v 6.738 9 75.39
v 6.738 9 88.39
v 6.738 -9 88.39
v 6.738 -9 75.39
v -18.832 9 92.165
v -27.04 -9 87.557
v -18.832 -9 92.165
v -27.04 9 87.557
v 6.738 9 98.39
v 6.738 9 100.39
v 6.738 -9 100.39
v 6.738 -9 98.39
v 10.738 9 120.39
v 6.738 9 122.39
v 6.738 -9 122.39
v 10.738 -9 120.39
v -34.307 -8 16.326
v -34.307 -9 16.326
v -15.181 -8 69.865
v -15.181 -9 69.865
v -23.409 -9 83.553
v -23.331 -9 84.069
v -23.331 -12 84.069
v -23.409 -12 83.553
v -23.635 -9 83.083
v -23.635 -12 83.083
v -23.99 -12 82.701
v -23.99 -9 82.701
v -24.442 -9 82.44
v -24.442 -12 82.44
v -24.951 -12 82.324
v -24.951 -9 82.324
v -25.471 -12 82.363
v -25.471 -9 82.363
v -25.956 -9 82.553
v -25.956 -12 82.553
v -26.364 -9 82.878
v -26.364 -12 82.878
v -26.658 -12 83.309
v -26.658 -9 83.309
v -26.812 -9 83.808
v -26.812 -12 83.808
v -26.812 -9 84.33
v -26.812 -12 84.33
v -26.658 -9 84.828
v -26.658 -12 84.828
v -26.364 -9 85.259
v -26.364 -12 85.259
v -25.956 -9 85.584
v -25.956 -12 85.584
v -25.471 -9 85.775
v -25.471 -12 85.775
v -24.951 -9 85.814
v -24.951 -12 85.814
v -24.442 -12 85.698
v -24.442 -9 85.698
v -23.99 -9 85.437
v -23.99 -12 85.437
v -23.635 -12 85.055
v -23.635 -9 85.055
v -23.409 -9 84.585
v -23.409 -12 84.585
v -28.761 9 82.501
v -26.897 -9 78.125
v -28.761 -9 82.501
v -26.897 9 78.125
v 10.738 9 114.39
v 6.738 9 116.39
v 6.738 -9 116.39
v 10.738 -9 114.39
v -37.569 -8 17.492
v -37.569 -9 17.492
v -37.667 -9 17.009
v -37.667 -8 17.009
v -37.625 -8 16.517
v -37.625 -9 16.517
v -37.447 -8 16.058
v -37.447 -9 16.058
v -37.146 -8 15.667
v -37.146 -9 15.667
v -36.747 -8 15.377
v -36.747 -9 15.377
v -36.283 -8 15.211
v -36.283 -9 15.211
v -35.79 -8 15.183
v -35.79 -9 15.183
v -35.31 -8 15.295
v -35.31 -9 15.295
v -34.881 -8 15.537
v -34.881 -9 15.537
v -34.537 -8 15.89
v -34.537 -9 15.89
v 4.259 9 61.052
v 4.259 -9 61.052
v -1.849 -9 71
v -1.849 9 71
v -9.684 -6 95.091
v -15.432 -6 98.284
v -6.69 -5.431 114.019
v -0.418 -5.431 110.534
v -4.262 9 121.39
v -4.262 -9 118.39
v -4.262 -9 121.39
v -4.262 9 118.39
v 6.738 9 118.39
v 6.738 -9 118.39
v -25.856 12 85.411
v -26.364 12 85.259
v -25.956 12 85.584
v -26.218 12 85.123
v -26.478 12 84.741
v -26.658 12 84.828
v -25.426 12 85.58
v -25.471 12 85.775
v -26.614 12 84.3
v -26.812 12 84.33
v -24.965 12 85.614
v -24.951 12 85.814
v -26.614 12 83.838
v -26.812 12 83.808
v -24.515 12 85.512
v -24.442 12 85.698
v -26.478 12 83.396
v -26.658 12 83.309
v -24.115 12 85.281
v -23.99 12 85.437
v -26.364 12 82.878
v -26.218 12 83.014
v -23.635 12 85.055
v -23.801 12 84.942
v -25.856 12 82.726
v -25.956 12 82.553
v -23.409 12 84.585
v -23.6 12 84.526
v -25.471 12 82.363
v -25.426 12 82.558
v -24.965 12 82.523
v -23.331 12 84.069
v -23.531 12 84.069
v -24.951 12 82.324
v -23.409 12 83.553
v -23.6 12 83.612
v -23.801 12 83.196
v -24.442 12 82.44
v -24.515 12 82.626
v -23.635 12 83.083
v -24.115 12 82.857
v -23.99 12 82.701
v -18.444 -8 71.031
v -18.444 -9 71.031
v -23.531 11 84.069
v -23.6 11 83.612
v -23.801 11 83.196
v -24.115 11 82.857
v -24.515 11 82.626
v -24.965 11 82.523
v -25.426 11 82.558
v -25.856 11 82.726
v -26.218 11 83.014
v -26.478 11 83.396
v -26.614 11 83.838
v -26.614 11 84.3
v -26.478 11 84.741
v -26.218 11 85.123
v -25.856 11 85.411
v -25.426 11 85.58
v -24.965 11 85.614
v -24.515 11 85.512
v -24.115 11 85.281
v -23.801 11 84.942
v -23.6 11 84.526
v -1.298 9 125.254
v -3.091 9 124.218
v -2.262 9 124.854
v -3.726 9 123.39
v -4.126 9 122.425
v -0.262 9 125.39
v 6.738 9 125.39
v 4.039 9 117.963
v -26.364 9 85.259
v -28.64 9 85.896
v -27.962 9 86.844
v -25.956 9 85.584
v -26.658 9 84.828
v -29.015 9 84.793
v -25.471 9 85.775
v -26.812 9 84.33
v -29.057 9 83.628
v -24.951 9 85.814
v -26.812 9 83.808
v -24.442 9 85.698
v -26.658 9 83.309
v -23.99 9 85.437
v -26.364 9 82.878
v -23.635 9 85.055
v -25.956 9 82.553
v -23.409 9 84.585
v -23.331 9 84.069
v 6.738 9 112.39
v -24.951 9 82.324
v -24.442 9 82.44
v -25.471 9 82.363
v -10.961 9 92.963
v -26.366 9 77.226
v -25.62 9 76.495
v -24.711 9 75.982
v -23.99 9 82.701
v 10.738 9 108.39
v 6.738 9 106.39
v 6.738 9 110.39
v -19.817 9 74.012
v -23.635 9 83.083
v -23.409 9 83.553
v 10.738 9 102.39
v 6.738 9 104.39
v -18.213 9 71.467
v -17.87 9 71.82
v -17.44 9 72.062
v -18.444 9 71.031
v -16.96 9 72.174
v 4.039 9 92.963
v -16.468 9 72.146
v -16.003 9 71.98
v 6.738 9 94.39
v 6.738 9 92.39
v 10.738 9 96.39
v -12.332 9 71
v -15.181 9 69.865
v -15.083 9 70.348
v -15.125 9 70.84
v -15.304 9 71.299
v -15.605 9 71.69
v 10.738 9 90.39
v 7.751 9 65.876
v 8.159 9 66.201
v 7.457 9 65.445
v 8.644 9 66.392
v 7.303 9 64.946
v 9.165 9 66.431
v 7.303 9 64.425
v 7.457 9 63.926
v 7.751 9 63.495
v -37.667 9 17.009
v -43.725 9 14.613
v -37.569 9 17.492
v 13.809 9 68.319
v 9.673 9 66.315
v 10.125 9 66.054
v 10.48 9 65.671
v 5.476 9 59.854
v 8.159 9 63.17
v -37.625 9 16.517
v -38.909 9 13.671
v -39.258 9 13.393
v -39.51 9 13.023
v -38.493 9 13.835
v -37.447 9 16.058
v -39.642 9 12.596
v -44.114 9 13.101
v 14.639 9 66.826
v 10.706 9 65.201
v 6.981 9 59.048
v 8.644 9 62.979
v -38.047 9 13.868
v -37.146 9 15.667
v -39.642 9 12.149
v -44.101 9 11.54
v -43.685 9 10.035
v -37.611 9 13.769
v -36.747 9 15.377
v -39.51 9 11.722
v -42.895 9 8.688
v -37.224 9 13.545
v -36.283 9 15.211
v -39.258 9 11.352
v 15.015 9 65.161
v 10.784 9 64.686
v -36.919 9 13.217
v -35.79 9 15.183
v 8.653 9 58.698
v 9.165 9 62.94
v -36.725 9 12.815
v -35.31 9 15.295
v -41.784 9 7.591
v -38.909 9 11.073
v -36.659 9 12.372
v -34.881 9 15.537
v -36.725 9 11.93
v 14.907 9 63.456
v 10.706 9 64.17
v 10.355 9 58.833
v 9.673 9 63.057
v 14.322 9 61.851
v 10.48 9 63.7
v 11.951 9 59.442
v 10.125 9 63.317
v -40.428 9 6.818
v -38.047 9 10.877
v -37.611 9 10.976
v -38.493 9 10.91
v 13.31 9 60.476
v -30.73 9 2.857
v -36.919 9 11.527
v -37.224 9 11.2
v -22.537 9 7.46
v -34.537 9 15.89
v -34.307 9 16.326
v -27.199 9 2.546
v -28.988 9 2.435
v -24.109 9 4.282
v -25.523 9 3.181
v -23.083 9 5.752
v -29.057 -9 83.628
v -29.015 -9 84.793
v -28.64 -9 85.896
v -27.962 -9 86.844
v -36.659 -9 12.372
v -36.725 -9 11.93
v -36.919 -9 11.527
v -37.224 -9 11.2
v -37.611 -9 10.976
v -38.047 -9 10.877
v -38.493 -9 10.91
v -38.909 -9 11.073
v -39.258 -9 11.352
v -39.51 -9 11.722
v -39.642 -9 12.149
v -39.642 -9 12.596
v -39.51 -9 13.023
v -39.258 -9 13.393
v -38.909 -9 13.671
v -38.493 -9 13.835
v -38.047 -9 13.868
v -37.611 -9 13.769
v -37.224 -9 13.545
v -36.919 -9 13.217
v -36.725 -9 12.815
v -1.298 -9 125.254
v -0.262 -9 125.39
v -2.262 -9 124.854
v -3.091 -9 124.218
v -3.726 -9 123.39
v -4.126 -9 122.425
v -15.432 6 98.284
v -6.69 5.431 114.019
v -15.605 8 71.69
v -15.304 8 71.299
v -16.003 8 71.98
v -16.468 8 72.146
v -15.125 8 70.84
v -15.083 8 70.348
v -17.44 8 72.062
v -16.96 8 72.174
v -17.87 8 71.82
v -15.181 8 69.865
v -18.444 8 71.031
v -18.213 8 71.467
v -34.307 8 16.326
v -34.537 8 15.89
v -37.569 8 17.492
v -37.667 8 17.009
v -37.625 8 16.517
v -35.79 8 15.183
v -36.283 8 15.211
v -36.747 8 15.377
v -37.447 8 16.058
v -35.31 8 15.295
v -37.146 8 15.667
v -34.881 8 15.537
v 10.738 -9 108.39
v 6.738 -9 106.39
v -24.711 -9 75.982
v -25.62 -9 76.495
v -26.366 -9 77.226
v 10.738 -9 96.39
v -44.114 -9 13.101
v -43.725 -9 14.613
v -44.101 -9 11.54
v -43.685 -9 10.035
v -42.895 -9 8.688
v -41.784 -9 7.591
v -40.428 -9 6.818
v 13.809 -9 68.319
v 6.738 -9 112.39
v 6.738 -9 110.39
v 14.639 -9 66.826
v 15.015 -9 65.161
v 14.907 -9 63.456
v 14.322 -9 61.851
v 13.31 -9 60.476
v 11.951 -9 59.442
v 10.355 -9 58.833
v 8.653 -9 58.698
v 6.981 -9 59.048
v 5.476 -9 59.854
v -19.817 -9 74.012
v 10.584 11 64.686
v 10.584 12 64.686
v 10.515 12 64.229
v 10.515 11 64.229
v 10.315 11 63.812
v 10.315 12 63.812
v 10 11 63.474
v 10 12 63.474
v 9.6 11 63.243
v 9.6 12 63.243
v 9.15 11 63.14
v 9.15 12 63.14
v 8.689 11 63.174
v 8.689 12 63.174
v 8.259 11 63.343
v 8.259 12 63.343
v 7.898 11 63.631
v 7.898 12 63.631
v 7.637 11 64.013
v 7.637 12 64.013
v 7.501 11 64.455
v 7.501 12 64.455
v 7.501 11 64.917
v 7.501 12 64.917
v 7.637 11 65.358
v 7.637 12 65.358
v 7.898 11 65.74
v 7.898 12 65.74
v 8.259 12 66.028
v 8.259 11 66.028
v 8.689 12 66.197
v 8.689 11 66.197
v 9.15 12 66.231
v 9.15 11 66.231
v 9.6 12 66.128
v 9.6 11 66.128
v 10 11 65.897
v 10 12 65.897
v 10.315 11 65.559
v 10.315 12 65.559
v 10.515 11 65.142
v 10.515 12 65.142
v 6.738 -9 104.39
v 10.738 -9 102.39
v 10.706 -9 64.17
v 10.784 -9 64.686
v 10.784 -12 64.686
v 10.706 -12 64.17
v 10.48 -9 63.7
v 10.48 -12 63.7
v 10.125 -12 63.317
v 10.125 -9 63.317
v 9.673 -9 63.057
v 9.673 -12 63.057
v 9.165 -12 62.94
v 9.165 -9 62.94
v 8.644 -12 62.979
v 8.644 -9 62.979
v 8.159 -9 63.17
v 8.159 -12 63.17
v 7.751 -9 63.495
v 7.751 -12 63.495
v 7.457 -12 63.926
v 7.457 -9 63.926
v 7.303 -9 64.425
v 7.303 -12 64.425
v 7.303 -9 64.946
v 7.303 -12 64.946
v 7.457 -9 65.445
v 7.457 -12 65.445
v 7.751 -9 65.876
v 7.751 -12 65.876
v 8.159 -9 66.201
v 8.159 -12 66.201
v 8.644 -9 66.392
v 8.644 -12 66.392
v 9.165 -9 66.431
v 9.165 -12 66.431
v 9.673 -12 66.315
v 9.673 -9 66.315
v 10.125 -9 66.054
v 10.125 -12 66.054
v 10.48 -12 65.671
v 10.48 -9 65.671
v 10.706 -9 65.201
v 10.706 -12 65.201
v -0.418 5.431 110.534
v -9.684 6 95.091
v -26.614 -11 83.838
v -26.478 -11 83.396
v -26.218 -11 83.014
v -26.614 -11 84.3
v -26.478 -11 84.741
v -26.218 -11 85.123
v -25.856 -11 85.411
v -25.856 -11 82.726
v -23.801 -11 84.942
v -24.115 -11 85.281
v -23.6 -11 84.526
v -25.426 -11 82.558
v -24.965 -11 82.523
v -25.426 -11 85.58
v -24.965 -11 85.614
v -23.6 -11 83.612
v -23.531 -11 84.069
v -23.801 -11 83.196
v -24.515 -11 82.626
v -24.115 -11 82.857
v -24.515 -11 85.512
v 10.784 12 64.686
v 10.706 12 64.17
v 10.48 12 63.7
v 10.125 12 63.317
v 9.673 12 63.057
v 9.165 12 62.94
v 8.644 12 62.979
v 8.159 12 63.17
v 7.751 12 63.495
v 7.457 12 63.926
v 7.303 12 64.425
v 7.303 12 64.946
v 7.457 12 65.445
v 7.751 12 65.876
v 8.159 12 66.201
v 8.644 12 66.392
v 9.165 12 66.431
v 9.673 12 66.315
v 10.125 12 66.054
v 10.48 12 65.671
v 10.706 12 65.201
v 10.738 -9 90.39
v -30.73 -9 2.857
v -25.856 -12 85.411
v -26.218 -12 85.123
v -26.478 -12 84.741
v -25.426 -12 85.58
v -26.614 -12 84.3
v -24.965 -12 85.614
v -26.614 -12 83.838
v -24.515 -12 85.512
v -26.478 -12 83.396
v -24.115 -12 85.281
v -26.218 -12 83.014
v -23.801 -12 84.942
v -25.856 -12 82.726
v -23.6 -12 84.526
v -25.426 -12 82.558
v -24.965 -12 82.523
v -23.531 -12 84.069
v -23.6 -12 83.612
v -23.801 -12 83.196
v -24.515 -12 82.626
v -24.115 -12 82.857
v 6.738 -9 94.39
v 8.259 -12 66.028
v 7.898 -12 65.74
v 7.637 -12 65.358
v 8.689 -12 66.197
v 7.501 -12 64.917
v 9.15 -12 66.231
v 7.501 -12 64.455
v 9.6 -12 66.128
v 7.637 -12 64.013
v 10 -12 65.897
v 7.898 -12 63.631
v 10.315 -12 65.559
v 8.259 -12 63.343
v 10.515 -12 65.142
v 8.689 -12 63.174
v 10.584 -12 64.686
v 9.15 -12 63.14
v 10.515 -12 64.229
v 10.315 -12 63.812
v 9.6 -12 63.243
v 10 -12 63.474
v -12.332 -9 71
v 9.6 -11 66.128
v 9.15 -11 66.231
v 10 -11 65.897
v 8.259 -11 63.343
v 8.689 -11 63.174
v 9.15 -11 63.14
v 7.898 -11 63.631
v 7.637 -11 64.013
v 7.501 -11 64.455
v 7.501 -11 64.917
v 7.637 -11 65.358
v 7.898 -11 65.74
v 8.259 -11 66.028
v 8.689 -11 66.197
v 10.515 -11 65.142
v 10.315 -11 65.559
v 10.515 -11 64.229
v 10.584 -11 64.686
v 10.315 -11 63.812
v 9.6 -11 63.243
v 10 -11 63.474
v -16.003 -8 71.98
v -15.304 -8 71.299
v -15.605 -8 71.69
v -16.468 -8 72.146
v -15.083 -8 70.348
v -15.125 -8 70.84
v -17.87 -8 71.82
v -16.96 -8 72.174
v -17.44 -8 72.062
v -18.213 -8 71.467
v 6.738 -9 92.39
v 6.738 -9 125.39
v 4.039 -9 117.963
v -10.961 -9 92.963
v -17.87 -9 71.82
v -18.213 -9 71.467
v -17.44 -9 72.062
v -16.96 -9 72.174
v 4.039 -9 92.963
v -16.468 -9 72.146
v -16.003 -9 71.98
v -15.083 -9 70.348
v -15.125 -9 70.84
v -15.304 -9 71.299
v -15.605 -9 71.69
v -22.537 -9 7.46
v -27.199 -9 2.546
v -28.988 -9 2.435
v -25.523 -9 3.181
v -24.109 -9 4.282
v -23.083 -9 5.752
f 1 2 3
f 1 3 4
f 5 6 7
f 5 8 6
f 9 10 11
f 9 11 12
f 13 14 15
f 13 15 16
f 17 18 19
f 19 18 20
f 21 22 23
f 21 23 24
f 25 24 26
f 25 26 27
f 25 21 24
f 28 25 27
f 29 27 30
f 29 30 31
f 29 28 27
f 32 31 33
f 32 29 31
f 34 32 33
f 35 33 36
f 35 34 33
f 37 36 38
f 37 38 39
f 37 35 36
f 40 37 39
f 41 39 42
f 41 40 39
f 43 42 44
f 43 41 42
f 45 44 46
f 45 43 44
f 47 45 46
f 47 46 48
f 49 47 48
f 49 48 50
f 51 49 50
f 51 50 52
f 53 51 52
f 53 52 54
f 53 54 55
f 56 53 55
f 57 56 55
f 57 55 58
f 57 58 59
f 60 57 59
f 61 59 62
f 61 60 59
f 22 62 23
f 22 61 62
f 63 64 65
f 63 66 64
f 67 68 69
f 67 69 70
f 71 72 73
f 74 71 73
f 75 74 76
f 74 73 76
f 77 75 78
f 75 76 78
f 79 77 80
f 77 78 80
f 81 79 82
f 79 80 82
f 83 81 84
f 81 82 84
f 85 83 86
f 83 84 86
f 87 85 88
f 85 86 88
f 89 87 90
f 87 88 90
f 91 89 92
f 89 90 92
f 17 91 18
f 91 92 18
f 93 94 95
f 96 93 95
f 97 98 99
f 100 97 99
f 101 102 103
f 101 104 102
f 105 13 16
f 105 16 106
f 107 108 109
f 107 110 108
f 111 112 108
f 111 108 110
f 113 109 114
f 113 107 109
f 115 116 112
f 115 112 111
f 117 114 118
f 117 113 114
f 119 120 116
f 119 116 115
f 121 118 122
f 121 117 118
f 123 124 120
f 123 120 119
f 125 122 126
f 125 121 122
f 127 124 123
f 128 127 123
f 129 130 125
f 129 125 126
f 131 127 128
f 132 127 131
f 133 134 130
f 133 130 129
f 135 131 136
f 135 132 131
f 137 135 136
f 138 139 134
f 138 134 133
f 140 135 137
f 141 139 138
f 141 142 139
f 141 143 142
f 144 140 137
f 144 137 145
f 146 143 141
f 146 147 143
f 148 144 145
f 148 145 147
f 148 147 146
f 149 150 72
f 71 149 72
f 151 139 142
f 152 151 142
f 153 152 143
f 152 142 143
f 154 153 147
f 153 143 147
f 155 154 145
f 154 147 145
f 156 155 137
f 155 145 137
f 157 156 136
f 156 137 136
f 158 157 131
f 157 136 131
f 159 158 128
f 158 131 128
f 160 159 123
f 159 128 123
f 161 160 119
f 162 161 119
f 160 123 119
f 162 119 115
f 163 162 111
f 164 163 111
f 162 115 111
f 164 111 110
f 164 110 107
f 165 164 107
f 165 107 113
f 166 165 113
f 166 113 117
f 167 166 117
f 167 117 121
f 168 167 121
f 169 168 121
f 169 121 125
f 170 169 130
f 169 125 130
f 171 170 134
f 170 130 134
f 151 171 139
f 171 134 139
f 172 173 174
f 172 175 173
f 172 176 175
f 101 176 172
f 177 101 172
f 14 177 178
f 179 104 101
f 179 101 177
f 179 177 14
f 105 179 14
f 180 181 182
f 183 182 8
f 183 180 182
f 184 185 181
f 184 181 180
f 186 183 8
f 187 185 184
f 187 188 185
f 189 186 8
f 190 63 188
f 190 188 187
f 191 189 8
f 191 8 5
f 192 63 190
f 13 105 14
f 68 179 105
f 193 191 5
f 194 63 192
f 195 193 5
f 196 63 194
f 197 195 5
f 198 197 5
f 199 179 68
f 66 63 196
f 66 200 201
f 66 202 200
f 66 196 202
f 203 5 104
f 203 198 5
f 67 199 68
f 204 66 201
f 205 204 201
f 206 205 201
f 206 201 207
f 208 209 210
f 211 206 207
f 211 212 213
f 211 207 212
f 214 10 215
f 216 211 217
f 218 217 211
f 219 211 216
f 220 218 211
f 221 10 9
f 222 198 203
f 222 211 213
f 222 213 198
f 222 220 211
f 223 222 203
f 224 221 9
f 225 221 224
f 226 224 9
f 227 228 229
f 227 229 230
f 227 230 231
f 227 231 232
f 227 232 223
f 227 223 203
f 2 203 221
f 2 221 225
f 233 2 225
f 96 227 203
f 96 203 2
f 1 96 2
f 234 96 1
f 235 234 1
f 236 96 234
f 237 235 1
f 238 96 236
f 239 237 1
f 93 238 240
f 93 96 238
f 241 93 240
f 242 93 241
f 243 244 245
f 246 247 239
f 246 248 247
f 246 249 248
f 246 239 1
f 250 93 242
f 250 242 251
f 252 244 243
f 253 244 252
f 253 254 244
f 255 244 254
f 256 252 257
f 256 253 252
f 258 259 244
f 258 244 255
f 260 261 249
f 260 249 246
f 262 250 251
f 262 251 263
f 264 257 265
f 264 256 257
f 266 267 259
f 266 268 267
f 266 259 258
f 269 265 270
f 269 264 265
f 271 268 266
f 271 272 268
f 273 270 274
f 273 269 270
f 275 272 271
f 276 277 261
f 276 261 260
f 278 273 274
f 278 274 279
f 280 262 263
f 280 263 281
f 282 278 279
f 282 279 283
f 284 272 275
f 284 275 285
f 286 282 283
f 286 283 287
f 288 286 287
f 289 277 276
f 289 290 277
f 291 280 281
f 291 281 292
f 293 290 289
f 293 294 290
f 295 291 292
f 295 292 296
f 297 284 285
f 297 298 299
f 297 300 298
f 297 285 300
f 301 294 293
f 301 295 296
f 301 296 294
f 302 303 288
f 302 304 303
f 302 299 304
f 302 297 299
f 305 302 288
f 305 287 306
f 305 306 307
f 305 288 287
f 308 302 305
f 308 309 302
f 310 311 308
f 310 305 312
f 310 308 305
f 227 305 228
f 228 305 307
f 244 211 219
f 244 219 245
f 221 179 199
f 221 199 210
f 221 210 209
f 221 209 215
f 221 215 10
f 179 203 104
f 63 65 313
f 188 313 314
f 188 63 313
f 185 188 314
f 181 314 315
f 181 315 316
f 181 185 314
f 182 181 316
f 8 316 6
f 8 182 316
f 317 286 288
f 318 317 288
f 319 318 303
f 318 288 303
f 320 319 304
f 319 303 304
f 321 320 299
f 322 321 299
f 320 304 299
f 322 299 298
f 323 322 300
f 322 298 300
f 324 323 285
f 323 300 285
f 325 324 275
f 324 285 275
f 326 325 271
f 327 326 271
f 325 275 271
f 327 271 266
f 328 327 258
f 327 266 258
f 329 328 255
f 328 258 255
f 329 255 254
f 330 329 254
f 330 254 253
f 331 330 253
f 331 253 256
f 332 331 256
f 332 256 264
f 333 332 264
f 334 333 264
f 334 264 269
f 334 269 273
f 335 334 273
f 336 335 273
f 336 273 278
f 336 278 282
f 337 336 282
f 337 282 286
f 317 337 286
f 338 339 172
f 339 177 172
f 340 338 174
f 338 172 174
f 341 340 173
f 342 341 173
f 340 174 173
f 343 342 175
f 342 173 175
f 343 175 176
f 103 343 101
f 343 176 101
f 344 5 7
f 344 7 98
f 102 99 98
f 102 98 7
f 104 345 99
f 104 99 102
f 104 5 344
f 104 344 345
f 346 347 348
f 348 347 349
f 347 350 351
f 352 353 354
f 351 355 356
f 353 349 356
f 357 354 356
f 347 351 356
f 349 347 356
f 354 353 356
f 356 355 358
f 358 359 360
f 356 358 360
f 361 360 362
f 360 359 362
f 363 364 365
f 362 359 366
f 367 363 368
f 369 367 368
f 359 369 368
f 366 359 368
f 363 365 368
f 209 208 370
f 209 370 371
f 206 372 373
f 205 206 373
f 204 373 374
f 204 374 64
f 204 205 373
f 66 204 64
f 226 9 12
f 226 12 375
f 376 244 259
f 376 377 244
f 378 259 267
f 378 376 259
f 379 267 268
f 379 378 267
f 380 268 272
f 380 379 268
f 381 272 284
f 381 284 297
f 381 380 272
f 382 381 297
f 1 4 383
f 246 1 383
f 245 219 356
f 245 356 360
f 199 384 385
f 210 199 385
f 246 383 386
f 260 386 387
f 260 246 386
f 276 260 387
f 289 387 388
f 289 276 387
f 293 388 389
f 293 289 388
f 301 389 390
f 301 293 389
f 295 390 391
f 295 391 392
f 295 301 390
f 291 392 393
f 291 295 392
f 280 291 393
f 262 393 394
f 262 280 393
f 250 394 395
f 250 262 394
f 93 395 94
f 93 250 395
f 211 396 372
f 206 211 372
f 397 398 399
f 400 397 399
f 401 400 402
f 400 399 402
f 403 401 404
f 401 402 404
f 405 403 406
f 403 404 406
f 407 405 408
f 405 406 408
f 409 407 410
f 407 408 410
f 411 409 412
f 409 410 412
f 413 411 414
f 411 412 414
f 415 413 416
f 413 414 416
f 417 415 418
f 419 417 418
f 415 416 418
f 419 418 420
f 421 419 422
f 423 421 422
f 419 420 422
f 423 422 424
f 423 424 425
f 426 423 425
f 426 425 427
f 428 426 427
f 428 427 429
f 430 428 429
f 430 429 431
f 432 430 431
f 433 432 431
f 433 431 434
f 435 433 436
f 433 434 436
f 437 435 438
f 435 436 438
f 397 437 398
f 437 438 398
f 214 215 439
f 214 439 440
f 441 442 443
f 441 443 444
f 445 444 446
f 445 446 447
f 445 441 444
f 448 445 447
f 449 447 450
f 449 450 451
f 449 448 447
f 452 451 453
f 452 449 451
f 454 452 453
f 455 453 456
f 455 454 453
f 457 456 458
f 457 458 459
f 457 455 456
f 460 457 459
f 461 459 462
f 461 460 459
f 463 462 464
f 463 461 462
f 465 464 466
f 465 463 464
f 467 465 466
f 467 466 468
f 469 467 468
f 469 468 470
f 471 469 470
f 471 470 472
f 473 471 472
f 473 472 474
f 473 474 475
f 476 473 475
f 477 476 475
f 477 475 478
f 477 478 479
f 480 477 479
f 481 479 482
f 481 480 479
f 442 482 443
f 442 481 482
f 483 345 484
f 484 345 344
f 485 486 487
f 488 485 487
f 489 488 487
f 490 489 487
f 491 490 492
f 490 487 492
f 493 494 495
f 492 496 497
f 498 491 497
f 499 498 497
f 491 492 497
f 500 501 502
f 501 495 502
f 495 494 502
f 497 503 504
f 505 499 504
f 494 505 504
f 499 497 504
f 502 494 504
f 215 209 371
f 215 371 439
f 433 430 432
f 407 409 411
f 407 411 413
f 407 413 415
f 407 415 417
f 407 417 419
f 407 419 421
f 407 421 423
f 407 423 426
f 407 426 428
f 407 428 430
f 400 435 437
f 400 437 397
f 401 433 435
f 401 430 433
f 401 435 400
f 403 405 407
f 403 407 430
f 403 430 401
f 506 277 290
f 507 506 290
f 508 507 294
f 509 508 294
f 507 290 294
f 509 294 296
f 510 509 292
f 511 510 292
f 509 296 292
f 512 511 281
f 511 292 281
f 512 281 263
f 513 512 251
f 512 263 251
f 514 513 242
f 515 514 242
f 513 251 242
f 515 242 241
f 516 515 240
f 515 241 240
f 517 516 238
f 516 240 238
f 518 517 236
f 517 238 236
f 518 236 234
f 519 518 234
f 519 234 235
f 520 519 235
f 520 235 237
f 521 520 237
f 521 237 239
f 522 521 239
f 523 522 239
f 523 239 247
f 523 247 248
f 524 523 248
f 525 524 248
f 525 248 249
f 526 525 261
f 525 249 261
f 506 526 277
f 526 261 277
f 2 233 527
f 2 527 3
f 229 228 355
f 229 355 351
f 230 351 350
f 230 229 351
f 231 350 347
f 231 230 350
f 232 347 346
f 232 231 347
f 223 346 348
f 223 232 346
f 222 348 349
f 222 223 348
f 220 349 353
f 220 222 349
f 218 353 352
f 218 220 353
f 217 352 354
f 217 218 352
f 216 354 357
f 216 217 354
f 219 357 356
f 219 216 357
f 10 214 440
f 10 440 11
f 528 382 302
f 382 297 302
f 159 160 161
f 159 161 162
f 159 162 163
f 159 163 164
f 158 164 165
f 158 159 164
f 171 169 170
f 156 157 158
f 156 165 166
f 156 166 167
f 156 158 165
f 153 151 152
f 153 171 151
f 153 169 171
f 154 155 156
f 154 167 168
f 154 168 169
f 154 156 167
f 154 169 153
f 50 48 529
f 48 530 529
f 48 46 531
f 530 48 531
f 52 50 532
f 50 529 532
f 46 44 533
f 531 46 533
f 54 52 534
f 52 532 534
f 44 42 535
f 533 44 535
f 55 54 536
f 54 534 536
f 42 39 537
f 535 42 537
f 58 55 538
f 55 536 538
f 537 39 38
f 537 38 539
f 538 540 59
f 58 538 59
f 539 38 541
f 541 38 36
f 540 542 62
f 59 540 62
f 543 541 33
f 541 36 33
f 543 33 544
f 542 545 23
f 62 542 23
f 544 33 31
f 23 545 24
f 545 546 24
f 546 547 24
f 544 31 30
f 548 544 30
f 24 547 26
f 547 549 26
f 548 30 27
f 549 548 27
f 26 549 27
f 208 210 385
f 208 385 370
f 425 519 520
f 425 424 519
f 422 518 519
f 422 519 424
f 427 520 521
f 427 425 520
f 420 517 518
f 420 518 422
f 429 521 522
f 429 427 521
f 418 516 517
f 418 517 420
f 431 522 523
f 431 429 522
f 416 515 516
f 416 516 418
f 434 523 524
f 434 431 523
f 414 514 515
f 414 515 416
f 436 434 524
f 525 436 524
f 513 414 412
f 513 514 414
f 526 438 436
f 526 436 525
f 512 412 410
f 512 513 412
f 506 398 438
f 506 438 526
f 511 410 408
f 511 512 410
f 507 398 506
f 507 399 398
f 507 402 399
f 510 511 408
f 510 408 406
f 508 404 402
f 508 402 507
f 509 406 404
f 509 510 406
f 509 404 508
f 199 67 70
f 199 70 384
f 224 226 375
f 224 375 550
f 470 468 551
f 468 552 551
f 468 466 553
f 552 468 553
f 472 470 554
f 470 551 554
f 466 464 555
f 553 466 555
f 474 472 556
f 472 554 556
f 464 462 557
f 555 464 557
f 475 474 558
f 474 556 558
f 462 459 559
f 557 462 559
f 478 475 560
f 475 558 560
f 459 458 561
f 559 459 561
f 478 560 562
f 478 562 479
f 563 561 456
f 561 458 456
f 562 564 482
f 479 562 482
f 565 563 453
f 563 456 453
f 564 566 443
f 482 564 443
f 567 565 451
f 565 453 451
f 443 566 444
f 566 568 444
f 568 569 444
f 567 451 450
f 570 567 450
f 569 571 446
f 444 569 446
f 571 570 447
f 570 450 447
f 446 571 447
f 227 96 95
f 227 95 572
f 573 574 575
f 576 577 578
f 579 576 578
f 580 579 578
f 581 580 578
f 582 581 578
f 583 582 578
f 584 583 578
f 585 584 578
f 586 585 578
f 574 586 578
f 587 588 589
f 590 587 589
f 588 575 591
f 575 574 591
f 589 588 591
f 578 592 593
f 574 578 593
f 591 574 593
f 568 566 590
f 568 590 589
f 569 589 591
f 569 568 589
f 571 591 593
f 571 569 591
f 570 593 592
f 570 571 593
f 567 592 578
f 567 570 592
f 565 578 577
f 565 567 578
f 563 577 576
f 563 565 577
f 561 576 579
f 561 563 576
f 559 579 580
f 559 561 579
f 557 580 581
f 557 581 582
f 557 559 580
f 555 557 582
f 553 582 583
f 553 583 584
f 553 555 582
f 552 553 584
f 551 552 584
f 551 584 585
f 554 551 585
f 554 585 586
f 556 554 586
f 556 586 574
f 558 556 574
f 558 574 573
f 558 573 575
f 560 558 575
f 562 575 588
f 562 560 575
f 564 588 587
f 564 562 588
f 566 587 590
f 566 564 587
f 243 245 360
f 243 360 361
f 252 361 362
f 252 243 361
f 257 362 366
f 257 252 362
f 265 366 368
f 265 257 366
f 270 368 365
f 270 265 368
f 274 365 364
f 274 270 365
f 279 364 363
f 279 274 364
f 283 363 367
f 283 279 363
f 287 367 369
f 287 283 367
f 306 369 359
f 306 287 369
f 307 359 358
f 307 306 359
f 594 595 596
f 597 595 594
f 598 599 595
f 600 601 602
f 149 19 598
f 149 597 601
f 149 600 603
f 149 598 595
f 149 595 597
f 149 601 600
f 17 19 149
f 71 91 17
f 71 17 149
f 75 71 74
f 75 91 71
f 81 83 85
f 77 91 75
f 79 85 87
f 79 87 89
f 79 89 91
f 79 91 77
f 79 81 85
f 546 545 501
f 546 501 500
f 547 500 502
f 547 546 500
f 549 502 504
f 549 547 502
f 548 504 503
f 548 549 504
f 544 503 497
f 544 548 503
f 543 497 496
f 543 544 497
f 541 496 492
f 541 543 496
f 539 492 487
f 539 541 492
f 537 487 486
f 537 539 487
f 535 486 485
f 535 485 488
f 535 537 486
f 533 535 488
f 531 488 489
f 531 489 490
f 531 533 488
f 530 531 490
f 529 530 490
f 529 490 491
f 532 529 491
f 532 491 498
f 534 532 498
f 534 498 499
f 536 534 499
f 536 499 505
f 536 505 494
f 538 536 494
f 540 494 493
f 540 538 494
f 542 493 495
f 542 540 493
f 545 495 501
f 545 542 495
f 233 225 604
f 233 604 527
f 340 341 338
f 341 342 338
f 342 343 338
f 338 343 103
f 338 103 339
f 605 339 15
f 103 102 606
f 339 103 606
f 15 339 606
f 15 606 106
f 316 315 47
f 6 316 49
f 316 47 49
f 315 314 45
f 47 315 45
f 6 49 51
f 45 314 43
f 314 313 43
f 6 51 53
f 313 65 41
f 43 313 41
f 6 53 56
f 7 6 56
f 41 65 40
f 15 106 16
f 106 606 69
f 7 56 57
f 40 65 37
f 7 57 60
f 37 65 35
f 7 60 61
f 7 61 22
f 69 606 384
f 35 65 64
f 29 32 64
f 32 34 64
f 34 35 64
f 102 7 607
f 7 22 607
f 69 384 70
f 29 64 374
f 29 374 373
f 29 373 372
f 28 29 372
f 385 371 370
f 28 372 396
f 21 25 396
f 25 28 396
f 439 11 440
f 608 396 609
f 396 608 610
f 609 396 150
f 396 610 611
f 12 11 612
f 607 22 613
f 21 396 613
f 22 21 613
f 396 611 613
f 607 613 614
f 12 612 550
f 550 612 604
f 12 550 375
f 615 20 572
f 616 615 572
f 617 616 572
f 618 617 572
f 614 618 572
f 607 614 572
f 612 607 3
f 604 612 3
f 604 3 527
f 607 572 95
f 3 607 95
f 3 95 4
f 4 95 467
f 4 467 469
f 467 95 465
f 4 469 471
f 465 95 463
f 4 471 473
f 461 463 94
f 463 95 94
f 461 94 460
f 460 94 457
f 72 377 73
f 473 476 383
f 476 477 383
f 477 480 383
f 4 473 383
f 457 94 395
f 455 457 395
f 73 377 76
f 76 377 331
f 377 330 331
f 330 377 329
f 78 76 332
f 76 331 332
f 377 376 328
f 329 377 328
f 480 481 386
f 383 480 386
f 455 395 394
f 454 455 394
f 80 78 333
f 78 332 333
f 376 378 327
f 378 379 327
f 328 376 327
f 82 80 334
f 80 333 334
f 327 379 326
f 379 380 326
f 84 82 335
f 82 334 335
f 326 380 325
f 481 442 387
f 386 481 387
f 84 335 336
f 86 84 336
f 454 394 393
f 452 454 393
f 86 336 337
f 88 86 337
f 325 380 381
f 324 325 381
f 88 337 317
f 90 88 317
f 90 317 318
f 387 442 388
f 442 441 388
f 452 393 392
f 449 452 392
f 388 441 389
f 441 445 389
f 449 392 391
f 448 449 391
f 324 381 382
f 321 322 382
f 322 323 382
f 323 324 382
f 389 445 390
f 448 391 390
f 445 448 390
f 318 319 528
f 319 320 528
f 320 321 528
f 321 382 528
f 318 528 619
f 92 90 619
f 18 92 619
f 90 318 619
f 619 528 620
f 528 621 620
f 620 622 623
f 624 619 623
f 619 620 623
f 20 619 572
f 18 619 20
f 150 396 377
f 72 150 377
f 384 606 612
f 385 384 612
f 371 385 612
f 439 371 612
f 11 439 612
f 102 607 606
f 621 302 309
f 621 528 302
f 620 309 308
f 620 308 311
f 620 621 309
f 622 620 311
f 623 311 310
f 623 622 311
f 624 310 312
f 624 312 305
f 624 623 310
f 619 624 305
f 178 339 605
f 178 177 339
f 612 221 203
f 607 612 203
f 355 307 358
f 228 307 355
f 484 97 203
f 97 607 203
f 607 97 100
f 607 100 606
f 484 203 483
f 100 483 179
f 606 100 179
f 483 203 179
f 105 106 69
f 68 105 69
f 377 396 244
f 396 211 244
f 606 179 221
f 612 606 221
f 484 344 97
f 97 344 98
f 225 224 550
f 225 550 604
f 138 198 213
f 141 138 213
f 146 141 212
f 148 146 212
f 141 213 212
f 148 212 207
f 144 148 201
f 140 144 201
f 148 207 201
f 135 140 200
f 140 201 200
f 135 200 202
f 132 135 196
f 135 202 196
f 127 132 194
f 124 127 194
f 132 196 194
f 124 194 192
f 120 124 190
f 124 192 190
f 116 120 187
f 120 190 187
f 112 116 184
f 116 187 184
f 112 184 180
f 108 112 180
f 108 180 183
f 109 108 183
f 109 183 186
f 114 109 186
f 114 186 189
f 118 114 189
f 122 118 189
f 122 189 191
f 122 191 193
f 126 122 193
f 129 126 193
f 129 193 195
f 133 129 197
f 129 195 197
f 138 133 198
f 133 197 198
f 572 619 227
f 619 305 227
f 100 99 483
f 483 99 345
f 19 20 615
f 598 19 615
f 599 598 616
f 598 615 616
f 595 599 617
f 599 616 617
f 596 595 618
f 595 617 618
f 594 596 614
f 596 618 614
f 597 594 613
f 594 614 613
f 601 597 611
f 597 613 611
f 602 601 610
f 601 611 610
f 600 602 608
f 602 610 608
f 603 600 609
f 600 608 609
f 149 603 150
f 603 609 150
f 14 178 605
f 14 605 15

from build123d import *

# Parameters (mm, degrees)
BOSS_EXTRUDE1_DEPTH = 9
FILLET1_R           = 6
FILLET2_R           = 4
BOSS_EXTRUDE2_DEPTH = 18
LPATTERN1_COUNT     = 6
LPATTERN1_PITCH     = 6
CUT_EXTRUDE1_DEPTH  = 19
CUT_EXTRUDE2_DEPTH  = 8
SKETCH5_R           = 1.5
CUT_EXTRUDE3_DEPTH  = 19
SKETCH6_R           = 1.75
BOSS_EXTRUDE3_DEPTH = 3
SKETCH7_R           = 1.55
CUT_EXTRUDE4_DEPTH  = 1
SKETCH8_R           = 1.55
CUT_EXTRUDE5_DEPTH  = 1
CUT_EXTRUDE7_DEPTH  = 1


with BuildPart() as part:
    # Sketch1 → Boss-Extrude1 (new body, symmetric)
    with BuildSketch(Plane(origin=(0, 0, 0), x_dir=(1, 0, 0), z_dir=(0, 1, 0))):
        with BuildLine():
            Line((-12.33246069, -71), (-19.816764537, -74.012394232))
            Line((-19.816764537, -74.012394232), (-26.247607485, -76.600775811))
            Line((-26.247607485, -76.600775811), (-30.167039554, -85.800669955))
            Line((-30.167039554, -85.800669955), (-18.831549927, -92.165155394))
            Line((-18.831549927, -92.165155394), (-4.262261991, -118.389873678))
            Line((-4.262261991, -118.389873678), (-4.262261991, -125.389873678))
            Line((-4.262261991, -125.389873678), (6.737738009, -125.389873678))
            Line((6.737738009, -125.389873678), (6.737738009, -75.389873678))
            Line((6.737738009, -75.389873678), (13.808805821, -68.318805866))
            ThreePointArc((13.808805821, -68.318805866), (12.667091661, -59.910685459), (4.258971254, -61.052399619))
            Line((4.258971254, -61.052399619), (-1.849045895, -71))
            Line((-1.849045895, -71), (-12.33246069, -71))
        make_face()
        Polygon((-12.33246069, -71), (-19.816764537, -74.012394232), (-45.953718322, -9.075042525), (-23.735626524, 0), align=None)
    extrude(amount=BOSS_EXTRUDE1_DEPTH, both=True)

    # Fillet1
    fillet1_edges = [part.edges().sort_by_distance(p)[0] for p in [
        (-45.953718322, 0, 9.075042525),
        (-23.735626524, 0, 0),
    ]]
    fillet(fillet1_edges, radius=FILLET1_R)

    # Fillet2
    fillet2_edges = [part.edges().sort_by_distance(p)[0] for p in [
        (-4.262261991, 0, 125.389873678),
        (-30.167039554, 0, 85.800669955),
        (-26.247607485, 0, 76.600775811),
    ]]
    fillet(fillet2_edges, radius=FILLET2_R)

    # Sketch2 → Boss-Extrude2 (add)
    with BuildSketch(Plane(origin=(0, 9, 0), x_dir=(1, 0, 0), z_dir=(0, 1, 0))):
        Polygon((6.737738009, -118.389873678), (6.737738009, -122.389873678), (10.737738009, -120.389873678), align=None)
    boss_extrude2 = extrude(amount=-BOSS_EXTRUDE2_DEPTH)

    # LPattern1: Boss-Extrude2 ×6
    with Locations(*[(0, 0, -i * LPATTERN1_PITCH) for i in range(1, LPATTERN1_COUNT)]):
        add(boss_extrude2)

    # Sketch3 → Cut-Extrude1 (cut, through all)
    with BuildSketch(Plane(origin=(0, 9, 0), x_dir=(1, 0, 0), z_dir=(0, 1, 0))):
        Polygon((4.039450666, -92.96261283), (-10.960549334, -92.96261283), (4.039450666, -117.96261283), align=None)
    extrude(amount=-CUT_EXTRUDE1_DEPTH, mode=Mode.SUBTRACT)

    # Sketch4 → Cut-Extrude2 (cut)
    with BuildSketch(Plane(origin=(-53.516863555, 0, 29.731590864), x_dir=(0.485642931, 0, 0.874157276), z_dir=(-0.874157276, 0, 0.485642931))):
        Polygon((78.421432088, 6), (78.421432088, -6), (96.421432088, -5.431048589), (96.421432088, 5.431048589), align=None)
    extrude(amount=-CUT_EXTRUDE2_DEPTH, mode=Mode.SUBTRACT)

    # Sketch5 → Cut-Extrude3 (cut, through all)
    with BuildSketch(Plane(origin=(0, 9, 0), x_dir=(1, 0, 0), z_dir=(0, 1, 0))):
        with Locations((-38.158783011, -12.372383774)):
            Circle(SKETCH5_R)
    extrude(amount=-CUT_EXTRUDE3_DEPTH, mode=Mode.SUBTRACT)

    # Sketch6 → Boss-Extrude3 (add)
    with BuildSketch(Plane(origin=(0, 9, 0), x_dir=(1, 0, 0), z_dir=(0, 1, 0))):
        with Locations((-25.081319154, -84.068763596)):
            Circle(SKETCH6_R)
        with Locations((9.033888537, -64.685602742)):
            Circle(SKETCH6_R)
    boss_extrude3 = extrude(amount=BOSS_EXTRUDE3_DEPTH)

    # Sketch7 → Cut-Extrude4 (cut)
    with BuildSketch(Plane(origin=(0, 12, 0), x_dir=(1, 0, 0), z_dir=(0, 1, 0))):
        with Locations((-25.081319154, -84.068763596)):
            Circle(SKETCH7_R)
    cut_extrude4 = extrude(amount=-CUT_EXTRUDE4_DEPTH, mode=Mode.SUBTRACT)

    # Sketch8 → Cut-Extrude5 (cut)
    with BuildSketch(Plane(origin=(0, 12, 0), x_dir=(1, 0, 0), z_dir=(0, 1, 0))):
        with Locations((9.033888537, -64.685602742)):
            Circle(SKETCH8_R)
    cut_extrude5 = extrude(amount=-CUT_EXTRUDE5_DEPTH, mode=Mode.SUBTRACT)

    # Sketch9 → Cut-Extrude7 (cut)
    with BuildSketch(Plane(origin=(0, 9, 0), x_dir=(1, 0, 0), z_dir=(0, 1, 0))):
        with BuildLine():
            Line((-34.306763605, -16.326309504), (-15.181058532, -69.865166146))
            ThreePointArc((-15.181058532, -69.865166146), (-16.229593753, -72.079184588), (-18.443612196, -71.030649368))
            Line((-18.443612196, -71.030649368), (-37.569317268, -17.491792726))
            ThreePointArc((-37.569317268, -17.491792726), (-36.520782048, -15.277774283), (-34.306763605, -16.326309504))
        make_face()
    cut_extrude7 = extrude(amount=-CUT_EXTRUDE7_DEPTH, mode=Mode.SUBTRACT)

    # Mirror1: Boss-Extrude3, Cut-Extrude4, Cut-Extrude5, Cut-Extrude7 across plane
    add(boss_extrude3.mirror(Plane.ZX))
    add(cut_extrude4.mirror(Plane.ZX), mode=Mode.SUBTRACT)
    add(cut_extrude5.mirror(Plane.ZX), mode=Mode.SUBTRACT)
    add(cut_extrude7.mirror(Plane.ZX), mode=Mode.SUBTRACT)


solid = part.part
